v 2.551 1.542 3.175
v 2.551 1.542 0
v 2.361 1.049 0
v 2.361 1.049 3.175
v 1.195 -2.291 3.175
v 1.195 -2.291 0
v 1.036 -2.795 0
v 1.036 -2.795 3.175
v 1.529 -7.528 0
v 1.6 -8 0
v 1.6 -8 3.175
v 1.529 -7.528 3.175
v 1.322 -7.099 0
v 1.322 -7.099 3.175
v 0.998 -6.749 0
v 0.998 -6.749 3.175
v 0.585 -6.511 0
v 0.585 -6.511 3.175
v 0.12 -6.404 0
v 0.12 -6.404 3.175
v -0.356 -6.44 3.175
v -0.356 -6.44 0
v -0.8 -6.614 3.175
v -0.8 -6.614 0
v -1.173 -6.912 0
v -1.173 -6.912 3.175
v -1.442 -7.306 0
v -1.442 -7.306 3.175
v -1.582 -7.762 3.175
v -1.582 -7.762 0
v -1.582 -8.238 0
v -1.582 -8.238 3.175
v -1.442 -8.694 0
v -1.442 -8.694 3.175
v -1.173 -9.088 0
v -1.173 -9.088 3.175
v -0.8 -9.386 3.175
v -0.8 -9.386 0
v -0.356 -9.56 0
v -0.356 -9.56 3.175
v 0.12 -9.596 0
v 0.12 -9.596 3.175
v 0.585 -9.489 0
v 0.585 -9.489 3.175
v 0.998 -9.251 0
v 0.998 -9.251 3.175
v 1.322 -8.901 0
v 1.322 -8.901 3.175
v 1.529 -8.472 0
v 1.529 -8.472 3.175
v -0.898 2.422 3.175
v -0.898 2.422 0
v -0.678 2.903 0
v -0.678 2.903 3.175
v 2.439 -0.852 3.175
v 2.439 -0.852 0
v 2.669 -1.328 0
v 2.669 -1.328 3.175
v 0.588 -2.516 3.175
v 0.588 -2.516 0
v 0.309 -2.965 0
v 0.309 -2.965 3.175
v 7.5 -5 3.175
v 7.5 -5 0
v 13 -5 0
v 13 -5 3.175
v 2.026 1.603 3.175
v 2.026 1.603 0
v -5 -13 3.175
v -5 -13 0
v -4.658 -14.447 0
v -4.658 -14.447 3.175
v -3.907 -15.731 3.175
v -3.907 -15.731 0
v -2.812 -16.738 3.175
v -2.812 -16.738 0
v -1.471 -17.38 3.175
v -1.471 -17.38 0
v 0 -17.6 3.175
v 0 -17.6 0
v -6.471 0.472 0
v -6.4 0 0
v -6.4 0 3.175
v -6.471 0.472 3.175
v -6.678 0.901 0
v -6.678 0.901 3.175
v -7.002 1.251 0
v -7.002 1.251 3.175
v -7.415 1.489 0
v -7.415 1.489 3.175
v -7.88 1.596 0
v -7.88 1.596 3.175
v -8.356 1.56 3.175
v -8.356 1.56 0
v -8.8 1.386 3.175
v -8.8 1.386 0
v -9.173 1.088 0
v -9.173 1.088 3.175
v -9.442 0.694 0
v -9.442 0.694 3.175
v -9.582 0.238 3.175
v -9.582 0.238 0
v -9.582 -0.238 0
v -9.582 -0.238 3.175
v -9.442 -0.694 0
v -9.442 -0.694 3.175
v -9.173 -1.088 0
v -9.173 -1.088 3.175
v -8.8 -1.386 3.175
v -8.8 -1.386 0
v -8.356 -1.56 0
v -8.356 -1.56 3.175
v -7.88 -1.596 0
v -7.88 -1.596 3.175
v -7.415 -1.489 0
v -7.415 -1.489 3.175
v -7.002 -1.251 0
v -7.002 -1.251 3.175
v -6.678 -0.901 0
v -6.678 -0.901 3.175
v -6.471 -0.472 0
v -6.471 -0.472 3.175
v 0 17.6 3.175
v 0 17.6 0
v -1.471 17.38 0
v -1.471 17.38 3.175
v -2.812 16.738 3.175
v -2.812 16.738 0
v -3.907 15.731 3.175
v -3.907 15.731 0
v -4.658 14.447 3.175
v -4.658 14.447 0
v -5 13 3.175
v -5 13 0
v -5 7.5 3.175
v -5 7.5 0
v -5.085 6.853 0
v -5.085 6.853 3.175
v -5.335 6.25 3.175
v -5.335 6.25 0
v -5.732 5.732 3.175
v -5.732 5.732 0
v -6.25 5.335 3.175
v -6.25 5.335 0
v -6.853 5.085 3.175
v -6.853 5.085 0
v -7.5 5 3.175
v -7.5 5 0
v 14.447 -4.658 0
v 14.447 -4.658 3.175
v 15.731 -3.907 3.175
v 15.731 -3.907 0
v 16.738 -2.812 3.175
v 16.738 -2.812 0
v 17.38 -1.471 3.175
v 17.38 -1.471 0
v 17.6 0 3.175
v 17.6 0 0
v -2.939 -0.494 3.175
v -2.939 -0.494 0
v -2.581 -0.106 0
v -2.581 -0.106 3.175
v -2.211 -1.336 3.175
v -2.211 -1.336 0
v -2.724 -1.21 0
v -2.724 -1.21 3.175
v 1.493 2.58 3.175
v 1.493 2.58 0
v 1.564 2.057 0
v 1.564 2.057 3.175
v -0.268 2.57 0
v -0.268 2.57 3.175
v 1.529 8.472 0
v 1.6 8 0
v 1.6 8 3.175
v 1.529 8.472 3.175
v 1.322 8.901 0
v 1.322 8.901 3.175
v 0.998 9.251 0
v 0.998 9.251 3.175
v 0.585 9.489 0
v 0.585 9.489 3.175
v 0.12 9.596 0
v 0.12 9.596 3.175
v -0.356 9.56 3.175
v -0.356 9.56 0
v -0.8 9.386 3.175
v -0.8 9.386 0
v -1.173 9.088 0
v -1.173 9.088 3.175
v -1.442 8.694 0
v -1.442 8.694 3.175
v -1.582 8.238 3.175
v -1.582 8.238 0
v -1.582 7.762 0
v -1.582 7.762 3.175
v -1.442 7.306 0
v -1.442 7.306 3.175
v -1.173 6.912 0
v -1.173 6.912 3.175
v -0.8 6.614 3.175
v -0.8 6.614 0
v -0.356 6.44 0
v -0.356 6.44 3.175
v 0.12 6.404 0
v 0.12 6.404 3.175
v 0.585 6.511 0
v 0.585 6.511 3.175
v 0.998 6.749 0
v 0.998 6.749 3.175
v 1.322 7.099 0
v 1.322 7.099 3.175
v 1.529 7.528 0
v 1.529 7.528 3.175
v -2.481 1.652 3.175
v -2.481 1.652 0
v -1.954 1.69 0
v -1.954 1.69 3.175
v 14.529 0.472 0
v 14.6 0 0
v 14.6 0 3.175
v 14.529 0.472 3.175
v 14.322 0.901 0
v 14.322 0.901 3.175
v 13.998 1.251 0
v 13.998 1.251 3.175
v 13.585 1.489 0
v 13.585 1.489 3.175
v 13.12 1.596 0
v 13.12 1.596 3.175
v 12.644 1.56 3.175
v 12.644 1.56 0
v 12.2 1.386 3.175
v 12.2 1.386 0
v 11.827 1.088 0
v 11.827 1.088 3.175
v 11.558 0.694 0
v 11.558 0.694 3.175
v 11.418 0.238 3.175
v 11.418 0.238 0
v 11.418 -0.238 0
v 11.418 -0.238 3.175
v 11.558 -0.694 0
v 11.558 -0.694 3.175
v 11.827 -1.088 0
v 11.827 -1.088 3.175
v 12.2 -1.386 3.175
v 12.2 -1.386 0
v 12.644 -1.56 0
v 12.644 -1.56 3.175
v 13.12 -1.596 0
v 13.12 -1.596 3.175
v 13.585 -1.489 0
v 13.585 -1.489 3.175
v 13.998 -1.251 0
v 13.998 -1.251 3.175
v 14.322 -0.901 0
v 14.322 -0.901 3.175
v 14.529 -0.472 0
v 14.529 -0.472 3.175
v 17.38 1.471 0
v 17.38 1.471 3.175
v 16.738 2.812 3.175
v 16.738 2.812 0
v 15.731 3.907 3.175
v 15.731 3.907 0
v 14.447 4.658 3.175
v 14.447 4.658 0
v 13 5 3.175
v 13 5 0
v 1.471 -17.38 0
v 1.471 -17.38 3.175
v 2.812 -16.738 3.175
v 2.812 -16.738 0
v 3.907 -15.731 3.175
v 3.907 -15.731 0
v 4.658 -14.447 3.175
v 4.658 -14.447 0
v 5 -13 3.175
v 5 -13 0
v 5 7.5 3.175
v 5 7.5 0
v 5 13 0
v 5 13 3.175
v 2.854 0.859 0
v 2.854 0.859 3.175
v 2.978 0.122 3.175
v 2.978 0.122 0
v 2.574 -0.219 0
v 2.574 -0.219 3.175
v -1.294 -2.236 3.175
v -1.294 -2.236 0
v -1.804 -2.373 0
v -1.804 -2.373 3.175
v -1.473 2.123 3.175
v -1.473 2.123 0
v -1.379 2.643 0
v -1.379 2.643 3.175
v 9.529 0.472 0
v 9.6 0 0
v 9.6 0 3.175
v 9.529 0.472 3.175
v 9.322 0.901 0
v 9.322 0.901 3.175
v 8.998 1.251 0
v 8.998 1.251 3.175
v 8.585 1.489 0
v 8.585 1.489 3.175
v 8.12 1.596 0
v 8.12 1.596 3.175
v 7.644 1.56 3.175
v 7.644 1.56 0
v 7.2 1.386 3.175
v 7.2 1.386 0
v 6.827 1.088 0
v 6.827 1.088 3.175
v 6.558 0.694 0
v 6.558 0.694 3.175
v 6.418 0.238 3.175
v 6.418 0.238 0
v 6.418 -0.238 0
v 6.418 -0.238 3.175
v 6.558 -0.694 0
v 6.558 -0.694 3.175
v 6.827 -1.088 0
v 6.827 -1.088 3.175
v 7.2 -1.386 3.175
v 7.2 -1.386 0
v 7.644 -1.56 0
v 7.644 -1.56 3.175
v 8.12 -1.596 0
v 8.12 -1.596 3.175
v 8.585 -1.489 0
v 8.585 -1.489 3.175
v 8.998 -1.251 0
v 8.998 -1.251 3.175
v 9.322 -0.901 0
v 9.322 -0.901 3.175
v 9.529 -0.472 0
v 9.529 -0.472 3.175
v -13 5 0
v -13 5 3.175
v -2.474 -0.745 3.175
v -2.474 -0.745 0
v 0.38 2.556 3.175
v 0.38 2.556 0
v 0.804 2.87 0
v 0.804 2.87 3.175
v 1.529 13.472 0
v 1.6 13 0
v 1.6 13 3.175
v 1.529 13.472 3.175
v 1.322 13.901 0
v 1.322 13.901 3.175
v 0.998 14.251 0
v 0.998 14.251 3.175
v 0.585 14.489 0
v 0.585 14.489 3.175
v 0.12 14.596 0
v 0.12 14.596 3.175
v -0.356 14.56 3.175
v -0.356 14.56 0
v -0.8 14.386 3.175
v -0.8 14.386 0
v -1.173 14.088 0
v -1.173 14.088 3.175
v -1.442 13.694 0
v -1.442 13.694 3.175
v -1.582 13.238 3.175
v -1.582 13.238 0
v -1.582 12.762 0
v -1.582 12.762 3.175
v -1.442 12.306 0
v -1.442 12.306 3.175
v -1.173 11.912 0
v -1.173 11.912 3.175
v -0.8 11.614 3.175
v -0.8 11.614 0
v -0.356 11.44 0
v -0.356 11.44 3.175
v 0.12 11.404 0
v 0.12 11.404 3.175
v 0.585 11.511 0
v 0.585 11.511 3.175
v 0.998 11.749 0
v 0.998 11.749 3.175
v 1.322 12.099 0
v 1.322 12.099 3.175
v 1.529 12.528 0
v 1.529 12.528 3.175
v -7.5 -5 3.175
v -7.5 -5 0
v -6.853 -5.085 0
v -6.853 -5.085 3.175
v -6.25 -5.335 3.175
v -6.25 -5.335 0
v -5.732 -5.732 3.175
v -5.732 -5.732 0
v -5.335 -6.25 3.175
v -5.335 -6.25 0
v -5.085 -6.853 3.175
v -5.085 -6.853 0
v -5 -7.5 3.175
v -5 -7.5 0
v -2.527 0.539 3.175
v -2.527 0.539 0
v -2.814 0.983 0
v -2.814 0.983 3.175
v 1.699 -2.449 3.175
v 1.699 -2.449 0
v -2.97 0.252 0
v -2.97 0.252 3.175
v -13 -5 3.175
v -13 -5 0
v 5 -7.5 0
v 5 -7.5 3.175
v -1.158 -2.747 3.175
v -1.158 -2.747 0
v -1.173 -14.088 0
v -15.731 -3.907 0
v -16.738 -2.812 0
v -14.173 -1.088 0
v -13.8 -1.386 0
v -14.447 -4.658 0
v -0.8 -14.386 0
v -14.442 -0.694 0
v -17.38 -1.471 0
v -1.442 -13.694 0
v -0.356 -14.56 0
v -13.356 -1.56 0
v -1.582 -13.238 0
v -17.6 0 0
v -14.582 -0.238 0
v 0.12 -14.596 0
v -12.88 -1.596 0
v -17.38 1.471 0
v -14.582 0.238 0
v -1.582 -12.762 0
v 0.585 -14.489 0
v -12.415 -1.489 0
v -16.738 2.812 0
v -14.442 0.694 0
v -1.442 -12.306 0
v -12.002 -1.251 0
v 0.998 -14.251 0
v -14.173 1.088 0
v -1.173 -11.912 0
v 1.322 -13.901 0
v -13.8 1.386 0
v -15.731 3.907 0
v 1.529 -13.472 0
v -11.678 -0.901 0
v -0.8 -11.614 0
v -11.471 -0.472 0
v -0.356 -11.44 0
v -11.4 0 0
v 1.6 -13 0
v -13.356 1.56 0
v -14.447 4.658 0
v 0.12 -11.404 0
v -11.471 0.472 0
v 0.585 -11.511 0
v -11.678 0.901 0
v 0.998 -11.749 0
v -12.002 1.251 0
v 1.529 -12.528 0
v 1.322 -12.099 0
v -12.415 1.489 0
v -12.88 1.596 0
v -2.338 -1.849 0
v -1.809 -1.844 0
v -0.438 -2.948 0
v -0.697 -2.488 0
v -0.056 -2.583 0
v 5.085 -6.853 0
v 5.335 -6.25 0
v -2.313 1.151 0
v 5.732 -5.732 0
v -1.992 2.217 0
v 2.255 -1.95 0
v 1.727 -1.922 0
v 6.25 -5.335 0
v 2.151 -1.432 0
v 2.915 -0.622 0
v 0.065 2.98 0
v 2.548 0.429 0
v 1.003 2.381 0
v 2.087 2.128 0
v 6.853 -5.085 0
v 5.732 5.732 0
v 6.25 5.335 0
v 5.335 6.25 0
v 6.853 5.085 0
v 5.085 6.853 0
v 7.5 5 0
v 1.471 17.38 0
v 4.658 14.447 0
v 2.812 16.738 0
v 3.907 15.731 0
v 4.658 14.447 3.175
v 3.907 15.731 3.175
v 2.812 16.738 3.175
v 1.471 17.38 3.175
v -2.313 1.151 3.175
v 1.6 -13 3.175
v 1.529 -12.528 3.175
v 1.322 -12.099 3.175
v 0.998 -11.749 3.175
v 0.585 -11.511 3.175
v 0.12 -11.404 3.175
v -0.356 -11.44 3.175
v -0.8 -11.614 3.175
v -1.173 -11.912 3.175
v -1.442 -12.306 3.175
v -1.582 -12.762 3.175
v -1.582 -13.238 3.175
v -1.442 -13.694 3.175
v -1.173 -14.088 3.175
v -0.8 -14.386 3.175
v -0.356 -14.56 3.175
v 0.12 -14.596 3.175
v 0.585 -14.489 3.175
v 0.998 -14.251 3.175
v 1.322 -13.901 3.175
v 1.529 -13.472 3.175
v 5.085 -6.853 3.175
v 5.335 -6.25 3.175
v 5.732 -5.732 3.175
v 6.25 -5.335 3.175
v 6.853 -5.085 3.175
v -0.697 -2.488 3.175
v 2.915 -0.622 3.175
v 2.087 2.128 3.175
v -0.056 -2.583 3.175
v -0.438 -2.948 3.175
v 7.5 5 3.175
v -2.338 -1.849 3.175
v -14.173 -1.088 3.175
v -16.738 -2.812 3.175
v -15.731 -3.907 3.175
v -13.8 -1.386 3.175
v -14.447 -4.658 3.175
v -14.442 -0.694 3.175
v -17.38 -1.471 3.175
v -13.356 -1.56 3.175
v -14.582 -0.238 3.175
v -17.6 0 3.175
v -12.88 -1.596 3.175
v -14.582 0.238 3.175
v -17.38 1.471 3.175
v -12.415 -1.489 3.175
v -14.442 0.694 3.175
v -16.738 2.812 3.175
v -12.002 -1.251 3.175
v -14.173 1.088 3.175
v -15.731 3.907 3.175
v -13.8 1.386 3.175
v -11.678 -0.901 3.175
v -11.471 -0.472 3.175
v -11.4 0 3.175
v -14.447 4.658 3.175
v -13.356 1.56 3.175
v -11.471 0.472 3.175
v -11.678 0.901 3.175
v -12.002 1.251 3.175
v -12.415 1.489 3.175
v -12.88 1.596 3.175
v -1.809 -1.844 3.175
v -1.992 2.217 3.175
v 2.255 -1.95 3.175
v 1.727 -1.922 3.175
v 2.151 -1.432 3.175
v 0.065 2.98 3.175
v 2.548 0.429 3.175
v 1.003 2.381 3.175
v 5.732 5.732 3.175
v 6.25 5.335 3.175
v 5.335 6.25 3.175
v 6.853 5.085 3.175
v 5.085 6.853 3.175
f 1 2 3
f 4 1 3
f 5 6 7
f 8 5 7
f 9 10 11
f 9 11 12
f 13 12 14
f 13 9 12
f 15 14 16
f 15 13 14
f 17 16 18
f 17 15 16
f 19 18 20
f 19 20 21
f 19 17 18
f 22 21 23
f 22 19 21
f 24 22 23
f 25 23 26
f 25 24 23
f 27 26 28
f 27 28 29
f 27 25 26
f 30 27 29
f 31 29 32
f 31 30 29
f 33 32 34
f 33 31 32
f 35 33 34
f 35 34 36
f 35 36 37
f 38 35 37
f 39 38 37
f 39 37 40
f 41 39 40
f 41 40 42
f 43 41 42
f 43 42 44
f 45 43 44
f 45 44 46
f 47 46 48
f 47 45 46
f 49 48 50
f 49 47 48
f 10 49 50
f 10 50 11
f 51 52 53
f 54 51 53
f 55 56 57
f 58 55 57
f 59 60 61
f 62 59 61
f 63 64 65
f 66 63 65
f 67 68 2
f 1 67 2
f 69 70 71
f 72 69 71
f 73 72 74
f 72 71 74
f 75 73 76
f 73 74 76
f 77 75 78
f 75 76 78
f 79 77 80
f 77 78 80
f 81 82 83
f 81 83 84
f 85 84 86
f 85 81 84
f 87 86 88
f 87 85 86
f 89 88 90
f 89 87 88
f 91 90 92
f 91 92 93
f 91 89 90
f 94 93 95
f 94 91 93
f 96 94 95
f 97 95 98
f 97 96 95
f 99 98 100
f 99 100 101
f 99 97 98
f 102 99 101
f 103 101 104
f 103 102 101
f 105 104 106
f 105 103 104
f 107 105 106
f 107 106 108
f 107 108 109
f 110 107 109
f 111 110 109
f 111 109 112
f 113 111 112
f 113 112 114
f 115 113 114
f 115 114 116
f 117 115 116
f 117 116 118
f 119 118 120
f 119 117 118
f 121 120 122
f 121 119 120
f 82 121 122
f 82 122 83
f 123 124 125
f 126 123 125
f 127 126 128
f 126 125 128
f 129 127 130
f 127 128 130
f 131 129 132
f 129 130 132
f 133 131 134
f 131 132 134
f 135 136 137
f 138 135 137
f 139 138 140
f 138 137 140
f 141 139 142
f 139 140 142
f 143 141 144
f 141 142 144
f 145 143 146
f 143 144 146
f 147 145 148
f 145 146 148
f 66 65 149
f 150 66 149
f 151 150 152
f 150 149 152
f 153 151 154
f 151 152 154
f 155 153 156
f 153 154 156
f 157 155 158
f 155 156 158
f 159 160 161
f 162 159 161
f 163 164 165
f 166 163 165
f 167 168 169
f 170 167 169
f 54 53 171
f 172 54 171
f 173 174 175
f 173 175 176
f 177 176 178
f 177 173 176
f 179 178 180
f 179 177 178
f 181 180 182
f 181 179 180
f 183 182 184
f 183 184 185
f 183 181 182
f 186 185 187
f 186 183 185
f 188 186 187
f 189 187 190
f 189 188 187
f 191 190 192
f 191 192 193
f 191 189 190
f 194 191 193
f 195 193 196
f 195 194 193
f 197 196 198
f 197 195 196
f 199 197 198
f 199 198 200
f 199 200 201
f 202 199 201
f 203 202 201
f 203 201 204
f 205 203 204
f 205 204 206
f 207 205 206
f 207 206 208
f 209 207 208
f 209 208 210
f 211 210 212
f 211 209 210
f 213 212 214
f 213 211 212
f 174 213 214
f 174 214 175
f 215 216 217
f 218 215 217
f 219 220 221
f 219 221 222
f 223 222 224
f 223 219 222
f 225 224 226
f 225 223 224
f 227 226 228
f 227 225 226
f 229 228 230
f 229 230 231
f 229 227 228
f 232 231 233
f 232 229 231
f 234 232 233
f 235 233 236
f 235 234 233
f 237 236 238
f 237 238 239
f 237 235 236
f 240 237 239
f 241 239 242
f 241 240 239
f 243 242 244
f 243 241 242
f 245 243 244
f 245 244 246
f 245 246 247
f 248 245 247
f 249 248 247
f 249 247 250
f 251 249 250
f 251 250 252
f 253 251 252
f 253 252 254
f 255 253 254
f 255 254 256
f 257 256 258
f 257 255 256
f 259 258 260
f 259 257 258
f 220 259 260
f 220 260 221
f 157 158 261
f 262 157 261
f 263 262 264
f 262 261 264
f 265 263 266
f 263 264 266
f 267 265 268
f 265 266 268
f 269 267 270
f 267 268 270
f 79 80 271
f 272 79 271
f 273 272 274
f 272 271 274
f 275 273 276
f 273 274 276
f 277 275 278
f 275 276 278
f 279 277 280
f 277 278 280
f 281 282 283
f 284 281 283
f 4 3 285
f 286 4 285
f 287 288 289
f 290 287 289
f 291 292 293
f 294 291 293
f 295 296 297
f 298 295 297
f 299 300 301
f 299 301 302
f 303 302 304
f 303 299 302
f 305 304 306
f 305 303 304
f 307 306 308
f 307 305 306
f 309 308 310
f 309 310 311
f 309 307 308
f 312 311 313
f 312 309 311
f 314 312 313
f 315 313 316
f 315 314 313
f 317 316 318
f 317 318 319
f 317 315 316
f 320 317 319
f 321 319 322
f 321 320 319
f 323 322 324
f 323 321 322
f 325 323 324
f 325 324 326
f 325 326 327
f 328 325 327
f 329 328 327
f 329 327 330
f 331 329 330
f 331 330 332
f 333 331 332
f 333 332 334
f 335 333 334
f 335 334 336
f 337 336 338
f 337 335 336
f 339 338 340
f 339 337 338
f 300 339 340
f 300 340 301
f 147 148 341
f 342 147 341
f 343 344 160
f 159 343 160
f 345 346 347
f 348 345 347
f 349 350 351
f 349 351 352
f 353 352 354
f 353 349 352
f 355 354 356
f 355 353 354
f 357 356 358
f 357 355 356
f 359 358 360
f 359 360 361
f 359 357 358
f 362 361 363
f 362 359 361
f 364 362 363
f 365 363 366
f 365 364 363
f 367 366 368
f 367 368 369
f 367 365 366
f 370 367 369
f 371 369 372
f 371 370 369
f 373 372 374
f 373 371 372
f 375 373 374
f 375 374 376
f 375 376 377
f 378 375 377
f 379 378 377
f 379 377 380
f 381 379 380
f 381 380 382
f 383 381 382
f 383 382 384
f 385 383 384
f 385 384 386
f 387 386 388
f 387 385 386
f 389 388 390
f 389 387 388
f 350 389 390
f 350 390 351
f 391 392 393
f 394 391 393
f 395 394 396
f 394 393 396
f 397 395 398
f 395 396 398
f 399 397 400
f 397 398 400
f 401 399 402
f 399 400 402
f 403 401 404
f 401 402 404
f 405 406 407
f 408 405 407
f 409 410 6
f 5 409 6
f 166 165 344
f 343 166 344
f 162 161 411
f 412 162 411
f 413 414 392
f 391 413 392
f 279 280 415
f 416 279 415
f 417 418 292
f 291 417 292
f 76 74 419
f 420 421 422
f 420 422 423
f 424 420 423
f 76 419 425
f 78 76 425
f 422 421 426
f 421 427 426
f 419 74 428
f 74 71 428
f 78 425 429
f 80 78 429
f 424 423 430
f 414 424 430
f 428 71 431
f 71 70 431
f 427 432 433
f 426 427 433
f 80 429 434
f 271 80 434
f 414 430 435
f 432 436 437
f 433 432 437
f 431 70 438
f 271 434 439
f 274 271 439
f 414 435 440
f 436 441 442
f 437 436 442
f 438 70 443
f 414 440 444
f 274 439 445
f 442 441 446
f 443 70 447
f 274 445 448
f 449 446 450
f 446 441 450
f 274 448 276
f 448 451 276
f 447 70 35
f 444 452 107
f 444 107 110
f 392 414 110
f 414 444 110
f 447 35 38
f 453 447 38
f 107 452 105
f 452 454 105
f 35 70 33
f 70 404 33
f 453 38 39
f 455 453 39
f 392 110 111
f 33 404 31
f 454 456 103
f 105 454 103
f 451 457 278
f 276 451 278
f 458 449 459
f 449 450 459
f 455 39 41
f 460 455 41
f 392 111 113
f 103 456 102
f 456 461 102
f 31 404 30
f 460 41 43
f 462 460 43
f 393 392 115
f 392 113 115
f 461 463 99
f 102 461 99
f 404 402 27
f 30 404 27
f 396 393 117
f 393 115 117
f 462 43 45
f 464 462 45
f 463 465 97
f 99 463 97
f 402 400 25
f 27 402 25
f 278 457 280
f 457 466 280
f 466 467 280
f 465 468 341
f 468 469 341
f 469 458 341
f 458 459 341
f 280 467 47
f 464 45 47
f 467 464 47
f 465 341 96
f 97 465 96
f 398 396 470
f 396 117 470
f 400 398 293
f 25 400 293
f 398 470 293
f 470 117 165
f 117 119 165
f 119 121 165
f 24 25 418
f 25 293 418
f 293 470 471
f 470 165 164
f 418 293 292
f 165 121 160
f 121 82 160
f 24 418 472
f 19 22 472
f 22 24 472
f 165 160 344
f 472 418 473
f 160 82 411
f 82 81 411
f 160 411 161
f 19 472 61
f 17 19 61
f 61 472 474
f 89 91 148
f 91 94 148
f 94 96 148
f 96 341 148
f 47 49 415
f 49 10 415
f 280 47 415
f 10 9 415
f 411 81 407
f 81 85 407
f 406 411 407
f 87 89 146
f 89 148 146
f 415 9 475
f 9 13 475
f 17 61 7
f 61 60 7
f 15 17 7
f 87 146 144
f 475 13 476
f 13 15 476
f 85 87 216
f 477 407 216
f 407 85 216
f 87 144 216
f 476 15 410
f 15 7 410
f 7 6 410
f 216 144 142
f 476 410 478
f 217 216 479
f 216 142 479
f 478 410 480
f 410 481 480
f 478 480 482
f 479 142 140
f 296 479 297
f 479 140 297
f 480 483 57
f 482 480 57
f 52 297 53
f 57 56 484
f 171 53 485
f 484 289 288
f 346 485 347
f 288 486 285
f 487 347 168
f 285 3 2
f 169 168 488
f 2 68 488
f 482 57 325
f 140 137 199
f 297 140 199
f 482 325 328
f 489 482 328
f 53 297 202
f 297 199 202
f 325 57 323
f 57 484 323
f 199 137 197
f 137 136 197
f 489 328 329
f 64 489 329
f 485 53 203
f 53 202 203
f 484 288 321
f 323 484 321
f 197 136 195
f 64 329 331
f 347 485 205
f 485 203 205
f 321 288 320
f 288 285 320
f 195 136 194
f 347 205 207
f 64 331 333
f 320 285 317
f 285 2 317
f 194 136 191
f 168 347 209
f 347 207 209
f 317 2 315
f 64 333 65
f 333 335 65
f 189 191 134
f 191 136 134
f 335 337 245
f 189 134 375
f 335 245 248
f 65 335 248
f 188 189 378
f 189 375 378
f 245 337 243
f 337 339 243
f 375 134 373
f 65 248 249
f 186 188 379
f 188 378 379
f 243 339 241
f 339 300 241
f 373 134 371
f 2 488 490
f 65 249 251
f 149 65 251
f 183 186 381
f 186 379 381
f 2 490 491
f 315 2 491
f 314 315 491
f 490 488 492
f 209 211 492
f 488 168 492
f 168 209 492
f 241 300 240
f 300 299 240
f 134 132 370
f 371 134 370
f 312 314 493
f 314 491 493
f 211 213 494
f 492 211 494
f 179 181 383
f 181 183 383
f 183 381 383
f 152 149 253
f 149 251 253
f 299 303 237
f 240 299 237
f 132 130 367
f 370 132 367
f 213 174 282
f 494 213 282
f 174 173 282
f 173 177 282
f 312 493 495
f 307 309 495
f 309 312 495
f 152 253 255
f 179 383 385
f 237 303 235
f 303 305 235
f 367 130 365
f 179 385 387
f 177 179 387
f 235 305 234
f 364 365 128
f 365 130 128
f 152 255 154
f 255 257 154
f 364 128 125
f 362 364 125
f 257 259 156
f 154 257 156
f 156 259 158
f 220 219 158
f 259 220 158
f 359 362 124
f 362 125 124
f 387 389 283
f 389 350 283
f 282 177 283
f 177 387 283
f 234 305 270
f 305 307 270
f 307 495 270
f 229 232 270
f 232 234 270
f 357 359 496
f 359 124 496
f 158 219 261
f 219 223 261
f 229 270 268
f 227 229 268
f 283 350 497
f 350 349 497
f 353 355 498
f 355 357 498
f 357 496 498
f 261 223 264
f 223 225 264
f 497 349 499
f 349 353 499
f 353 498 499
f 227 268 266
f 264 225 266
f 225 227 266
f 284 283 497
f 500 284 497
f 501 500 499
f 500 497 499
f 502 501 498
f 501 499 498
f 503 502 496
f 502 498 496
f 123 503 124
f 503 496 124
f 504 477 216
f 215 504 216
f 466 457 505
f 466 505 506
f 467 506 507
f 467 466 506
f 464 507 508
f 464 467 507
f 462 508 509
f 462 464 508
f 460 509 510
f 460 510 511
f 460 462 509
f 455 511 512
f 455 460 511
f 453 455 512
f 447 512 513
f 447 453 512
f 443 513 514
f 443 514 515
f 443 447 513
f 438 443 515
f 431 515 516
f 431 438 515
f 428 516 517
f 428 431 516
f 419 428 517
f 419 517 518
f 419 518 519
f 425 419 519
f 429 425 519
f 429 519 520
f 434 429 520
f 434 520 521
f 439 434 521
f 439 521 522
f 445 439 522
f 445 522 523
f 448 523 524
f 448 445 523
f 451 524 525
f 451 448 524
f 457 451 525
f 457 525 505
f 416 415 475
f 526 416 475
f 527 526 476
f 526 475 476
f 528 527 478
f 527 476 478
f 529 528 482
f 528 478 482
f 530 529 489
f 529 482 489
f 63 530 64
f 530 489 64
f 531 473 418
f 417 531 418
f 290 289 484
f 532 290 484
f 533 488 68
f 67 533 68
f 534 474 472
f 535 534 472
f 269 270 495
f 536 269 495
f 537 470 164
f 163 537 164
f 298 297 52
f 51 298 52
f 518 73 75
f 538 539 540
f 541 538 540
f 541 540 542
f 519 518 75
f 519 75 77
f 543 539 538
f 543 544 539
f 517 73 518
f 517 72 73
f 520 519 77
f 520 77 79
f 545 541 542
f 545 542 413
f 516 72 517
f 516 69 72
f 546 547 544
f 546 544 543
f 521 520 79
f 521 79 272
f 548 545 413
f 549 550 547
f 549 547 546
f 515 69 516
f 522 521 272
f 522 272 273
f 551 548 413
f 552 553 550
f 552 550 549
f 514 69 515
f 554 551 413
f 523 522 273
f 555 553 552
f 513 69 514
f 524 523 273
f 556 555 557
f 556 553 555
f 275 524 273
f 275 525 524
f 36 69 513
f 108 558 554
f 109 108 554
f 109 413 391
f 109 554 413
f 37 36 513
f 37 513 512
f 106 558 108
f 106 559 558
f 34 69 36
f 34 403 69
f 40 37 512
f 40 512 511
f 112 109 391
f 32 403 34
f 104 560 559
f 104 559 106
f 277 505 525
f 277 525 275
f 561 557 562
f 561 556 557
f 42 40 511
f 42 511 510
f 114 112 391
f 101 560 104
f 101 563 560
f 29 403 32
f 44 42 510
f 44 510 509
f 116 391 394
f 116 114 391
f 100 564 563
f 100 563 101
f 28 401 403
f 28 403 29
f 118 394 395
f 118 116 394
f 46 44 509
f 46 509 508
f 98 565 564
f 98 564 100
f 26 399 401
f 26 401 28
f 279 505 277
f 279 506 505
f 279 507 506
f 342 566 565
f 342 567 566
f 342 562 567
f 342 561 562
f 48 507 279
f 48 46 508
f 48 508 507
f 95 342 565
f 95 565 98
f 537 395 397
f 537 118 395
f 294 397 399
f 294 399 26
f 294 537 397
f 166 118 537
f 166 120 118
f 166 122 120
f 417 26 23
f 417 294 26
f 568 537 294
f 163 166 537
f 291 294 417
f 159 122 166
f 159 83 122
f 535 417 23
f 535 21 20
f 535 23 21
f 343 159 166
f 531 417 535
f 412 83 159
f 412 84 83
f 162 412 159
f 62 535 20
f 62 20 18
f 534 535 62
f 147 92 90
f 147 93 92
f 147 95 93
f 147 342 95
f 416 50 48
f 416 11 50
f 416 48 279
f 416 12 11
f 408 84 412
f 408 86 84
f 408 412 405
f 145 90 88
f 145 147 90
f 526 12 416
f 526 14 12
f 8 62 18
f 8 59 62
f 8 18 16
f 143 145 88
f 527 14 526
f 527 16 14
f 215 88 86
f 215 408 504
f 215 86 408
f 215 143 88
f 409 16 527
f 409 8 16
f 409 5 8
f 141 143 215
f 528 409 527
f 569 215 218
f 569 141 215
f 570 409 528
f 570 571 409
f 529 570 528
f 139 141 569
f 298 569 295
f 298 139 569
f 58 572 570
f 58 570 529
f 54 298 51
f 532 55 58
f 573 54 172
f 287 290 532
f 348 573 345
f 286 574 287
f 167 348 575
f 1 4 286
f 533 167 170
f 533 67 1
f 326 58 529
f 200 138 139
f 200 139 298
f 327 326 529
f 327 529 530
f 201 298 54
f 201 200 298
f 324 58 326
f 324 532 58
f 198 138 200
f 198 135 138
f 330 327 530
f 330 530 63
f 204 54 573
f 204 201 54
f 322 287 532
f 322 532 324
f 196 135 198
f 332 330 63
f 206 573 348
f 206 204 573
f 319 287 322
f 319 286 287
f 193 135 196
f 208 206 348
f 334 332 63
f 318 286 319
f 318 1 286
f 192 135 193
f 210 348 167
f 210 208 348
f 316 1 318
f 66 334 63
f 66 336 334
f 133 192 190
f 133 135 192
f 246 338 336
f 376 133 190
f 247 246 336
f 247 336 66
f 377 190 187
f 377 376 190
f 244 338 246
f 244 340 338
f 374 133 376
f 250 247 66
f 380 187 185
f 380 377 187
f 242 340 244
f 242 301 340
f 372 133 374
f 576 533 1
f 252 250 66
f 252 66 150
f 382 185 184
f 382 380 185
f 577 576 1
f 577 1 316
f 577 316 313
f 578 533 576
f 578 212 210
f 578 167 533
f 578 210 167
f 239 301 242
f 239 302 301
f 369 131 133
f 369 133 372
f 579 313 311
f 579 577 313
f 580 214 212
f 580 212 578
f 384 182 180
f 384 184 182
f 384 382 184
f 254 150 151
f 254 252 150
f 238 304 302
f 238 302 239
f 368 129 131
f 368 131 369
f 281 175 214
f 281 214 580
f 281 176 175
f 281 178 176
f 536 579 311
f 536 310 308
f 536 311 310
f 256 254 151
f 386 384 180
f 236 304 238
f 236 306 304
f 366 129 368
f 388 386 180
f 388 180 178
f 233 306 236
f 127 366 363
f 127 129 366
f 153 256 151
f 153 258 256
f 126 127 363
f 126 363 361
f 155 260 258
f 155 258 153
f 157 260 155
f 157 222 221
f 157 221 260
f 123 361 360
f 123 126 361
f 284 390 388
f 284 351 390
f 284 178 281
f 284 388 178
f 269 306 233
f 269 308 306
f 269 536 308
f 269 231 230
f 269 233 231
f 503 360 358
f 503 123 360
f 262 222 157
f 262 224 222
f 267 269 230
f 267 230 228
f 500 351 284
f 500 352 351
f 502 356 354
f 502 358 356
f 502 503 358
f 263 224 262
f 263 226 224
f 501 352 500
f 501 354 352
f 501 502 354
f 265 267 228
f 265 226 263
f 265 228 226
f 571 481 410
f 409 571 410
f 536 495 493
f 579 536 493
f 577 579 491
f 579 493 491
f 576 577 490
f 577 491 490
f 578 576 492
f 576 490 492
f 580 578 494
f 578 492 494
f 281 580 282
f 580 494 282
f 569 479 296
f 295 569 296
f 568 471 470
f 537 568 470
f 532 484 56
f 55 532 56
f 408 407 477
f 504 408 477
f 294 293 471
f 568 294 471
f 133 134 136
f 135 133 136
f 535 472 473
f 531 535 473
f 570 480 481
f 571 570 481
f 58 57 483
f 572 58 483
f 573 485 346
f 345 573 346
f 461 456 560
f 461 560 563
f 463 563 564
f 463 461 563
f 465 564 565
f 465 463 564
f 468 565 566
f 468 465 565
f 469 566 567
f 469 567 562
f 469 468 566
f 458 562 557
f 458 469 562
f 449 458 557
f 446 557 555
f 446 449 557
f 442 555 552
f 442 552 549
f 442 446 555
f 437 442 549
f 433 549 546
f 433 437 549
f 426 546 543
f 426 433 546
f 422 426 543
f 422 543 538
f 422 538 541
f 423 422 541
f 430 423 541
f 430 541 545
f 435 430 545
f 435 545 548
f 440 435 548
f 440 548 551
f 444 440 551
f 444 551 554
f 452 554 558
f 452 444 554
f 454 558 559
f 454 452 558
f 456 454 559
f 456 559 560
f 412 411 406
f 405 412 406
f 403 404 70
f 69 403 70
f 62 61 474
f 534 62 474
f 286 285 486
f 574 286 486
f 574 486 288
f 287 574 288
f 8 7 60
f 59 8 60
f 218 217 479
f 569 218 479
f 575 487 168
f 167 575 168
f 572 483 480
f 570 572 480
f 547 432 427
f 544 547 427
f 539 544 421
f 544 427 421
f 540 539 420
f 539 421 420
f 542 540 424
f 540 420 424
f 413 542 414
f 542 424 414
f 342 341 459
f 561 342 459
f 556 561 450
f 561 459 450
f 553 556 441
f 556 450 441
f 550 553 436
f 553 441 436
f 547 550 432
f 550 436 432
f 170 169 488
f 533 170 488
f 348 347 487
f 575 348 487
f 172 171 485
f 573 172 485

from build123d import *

# Parameters (mm, degrees)
F0_R     = 1.6
F1_DEPTH = 3.175


with BuildPart() as f1:
    # F0 (on Top) → F1 (new body)
    with BuildSketch(Plane.XY):
        with BuildLine():
            Line((5, 7.5), (5, 13))
            ThreePointArc((5, 13), (3.397058, 16.275063), (0, 17.6))
            ThreePointArc((0, 17.6), (-3.397058, 16.275063), (-5, 13))
            Line((-5, 13), (-5, 7.5))
            ThreePointArc((-5, 7.5), (-5.732233, 5.732233), (-7.5, 5))
            Line((-7.5, 5), (-13, 5))
            ThreePointArc((-13, 5), (-16.275063, 3.397058), (-17.6, 0))
            ThreePointArc((-17.6, 0), (-16.275063, -3.397058), (-13, -5))
            Line((-13, -5), (-7.5, -5))
            ThreePointArc((-7.5, -5), (-5.732233, -5.732233), (-5, -7.5))
            Line((-5, -7.5), (-5, -13))
            ThreePointArc((-5, -13), (-3.397058, -16.275063), (0, -17.6))
            ThreePointArc((0, -17.6), (3.397058, -16.275063), (5, -13))
            Line((5, -13), (5, -7.5))
            ThreePointArc((5, -7.5), (5.732233, -5.732233), (7.5, -5))
            Line((7.5, -5), (13, -5))
            ThreePointArc((13, -5), (16.275063, -3.397058), (17.6, 0))
            ThreePointArc((17.6, 0), (16.275063, 3.397058), (13, 5))
            Line((13, 5), (7.5, 5))
            ThreePointArc((7.5, 5), (5.732233, 5.732233), (5, 7.5))
        make_face()
        with Locations((0, -13)):
            Circle(F0_R, mode=Mode.SUBTRACT)
        with Locations((0, -8)):
            Circle(F0_R, mode=Mode.SUBTRACT)
        with Locations((-13, 0)):
            Circle(F0_R, mode=Mode.SUBTRACT)
        with Locations((-8, 0)):
            Circle(F0_R, mode=Mode.SUBTRACT)
        Polygon((-2.313127, 1.150841), (-2.481189, 1.651718), (-1.954254, 1.689937), (-1.992473, 2.216873), (-1.472587, 2.122848), (-1.378562, 2.642733), (-0.898392, 2.422372), (-0.678031, 2.902541), (-0.267748, 2.56969), (0.065104, 2.979972), (0.37972, 2.555544), (0.804147, 2.87016), (1.003328, 2.380825), (1.492663, 2.580005), (1.563894, 2.056509), (2.08739, 2.12774), (2.026194, 1.602976), (2.550958, 1.54178), (2.361181, 1.048721), (2.85424, 0.858945), (2.547807, 0.428572), (2.97818, 0.122139), (2.574344, -0.218506), (2.914989, -0.622342), (2.439126, -0.851855), (2.668639, -1.327718), (2.150649, -1.431678), (2.254609, -1.949669), (1.727038, -1.921544), (1.698914, -2.449115), (1.194912, -2.290672), (1.036469, -2.794674), (0.587704, -2.515869), (0.308899, -2.964634), (-0.056431, -2.582985), (-0.43808, -2.948314), (-0.69702, -2.487802), (-1.157533, -2.746742), (-1.293813, -2.236301), (-1.804254, -2.372581), (-1.809311, -1.844285), (-2.337607, -1.849342), (-2.211123, -1.336386), (-2.724079, -1.209903), (-2.474002, -0.744517), (-2.939388, -0.494441), (-2.581431, -0.105868), (-2.970004, 0.252089), (-2.526659, 0.539434), (-2.814004, 0.982779), align=None, mode=Mode.SUBTRACT)
        with Locations((8, 0)):
            Circle(F0_R, mode=Mode.SUBTRACT)
        with Locations((0, 8)):
            Circle(F0_R, mode=Mode.SUBTRACT)
        with Locations((13, 0)):
            Circle(F0_R, mode=Mode.SUBTRACT)
        with Locations((0, 13)):
            Circle(F0_R, mode=Mode.SUBTRACT)
    extrude(amount=F1_DEPTH)


solid = f1.part
